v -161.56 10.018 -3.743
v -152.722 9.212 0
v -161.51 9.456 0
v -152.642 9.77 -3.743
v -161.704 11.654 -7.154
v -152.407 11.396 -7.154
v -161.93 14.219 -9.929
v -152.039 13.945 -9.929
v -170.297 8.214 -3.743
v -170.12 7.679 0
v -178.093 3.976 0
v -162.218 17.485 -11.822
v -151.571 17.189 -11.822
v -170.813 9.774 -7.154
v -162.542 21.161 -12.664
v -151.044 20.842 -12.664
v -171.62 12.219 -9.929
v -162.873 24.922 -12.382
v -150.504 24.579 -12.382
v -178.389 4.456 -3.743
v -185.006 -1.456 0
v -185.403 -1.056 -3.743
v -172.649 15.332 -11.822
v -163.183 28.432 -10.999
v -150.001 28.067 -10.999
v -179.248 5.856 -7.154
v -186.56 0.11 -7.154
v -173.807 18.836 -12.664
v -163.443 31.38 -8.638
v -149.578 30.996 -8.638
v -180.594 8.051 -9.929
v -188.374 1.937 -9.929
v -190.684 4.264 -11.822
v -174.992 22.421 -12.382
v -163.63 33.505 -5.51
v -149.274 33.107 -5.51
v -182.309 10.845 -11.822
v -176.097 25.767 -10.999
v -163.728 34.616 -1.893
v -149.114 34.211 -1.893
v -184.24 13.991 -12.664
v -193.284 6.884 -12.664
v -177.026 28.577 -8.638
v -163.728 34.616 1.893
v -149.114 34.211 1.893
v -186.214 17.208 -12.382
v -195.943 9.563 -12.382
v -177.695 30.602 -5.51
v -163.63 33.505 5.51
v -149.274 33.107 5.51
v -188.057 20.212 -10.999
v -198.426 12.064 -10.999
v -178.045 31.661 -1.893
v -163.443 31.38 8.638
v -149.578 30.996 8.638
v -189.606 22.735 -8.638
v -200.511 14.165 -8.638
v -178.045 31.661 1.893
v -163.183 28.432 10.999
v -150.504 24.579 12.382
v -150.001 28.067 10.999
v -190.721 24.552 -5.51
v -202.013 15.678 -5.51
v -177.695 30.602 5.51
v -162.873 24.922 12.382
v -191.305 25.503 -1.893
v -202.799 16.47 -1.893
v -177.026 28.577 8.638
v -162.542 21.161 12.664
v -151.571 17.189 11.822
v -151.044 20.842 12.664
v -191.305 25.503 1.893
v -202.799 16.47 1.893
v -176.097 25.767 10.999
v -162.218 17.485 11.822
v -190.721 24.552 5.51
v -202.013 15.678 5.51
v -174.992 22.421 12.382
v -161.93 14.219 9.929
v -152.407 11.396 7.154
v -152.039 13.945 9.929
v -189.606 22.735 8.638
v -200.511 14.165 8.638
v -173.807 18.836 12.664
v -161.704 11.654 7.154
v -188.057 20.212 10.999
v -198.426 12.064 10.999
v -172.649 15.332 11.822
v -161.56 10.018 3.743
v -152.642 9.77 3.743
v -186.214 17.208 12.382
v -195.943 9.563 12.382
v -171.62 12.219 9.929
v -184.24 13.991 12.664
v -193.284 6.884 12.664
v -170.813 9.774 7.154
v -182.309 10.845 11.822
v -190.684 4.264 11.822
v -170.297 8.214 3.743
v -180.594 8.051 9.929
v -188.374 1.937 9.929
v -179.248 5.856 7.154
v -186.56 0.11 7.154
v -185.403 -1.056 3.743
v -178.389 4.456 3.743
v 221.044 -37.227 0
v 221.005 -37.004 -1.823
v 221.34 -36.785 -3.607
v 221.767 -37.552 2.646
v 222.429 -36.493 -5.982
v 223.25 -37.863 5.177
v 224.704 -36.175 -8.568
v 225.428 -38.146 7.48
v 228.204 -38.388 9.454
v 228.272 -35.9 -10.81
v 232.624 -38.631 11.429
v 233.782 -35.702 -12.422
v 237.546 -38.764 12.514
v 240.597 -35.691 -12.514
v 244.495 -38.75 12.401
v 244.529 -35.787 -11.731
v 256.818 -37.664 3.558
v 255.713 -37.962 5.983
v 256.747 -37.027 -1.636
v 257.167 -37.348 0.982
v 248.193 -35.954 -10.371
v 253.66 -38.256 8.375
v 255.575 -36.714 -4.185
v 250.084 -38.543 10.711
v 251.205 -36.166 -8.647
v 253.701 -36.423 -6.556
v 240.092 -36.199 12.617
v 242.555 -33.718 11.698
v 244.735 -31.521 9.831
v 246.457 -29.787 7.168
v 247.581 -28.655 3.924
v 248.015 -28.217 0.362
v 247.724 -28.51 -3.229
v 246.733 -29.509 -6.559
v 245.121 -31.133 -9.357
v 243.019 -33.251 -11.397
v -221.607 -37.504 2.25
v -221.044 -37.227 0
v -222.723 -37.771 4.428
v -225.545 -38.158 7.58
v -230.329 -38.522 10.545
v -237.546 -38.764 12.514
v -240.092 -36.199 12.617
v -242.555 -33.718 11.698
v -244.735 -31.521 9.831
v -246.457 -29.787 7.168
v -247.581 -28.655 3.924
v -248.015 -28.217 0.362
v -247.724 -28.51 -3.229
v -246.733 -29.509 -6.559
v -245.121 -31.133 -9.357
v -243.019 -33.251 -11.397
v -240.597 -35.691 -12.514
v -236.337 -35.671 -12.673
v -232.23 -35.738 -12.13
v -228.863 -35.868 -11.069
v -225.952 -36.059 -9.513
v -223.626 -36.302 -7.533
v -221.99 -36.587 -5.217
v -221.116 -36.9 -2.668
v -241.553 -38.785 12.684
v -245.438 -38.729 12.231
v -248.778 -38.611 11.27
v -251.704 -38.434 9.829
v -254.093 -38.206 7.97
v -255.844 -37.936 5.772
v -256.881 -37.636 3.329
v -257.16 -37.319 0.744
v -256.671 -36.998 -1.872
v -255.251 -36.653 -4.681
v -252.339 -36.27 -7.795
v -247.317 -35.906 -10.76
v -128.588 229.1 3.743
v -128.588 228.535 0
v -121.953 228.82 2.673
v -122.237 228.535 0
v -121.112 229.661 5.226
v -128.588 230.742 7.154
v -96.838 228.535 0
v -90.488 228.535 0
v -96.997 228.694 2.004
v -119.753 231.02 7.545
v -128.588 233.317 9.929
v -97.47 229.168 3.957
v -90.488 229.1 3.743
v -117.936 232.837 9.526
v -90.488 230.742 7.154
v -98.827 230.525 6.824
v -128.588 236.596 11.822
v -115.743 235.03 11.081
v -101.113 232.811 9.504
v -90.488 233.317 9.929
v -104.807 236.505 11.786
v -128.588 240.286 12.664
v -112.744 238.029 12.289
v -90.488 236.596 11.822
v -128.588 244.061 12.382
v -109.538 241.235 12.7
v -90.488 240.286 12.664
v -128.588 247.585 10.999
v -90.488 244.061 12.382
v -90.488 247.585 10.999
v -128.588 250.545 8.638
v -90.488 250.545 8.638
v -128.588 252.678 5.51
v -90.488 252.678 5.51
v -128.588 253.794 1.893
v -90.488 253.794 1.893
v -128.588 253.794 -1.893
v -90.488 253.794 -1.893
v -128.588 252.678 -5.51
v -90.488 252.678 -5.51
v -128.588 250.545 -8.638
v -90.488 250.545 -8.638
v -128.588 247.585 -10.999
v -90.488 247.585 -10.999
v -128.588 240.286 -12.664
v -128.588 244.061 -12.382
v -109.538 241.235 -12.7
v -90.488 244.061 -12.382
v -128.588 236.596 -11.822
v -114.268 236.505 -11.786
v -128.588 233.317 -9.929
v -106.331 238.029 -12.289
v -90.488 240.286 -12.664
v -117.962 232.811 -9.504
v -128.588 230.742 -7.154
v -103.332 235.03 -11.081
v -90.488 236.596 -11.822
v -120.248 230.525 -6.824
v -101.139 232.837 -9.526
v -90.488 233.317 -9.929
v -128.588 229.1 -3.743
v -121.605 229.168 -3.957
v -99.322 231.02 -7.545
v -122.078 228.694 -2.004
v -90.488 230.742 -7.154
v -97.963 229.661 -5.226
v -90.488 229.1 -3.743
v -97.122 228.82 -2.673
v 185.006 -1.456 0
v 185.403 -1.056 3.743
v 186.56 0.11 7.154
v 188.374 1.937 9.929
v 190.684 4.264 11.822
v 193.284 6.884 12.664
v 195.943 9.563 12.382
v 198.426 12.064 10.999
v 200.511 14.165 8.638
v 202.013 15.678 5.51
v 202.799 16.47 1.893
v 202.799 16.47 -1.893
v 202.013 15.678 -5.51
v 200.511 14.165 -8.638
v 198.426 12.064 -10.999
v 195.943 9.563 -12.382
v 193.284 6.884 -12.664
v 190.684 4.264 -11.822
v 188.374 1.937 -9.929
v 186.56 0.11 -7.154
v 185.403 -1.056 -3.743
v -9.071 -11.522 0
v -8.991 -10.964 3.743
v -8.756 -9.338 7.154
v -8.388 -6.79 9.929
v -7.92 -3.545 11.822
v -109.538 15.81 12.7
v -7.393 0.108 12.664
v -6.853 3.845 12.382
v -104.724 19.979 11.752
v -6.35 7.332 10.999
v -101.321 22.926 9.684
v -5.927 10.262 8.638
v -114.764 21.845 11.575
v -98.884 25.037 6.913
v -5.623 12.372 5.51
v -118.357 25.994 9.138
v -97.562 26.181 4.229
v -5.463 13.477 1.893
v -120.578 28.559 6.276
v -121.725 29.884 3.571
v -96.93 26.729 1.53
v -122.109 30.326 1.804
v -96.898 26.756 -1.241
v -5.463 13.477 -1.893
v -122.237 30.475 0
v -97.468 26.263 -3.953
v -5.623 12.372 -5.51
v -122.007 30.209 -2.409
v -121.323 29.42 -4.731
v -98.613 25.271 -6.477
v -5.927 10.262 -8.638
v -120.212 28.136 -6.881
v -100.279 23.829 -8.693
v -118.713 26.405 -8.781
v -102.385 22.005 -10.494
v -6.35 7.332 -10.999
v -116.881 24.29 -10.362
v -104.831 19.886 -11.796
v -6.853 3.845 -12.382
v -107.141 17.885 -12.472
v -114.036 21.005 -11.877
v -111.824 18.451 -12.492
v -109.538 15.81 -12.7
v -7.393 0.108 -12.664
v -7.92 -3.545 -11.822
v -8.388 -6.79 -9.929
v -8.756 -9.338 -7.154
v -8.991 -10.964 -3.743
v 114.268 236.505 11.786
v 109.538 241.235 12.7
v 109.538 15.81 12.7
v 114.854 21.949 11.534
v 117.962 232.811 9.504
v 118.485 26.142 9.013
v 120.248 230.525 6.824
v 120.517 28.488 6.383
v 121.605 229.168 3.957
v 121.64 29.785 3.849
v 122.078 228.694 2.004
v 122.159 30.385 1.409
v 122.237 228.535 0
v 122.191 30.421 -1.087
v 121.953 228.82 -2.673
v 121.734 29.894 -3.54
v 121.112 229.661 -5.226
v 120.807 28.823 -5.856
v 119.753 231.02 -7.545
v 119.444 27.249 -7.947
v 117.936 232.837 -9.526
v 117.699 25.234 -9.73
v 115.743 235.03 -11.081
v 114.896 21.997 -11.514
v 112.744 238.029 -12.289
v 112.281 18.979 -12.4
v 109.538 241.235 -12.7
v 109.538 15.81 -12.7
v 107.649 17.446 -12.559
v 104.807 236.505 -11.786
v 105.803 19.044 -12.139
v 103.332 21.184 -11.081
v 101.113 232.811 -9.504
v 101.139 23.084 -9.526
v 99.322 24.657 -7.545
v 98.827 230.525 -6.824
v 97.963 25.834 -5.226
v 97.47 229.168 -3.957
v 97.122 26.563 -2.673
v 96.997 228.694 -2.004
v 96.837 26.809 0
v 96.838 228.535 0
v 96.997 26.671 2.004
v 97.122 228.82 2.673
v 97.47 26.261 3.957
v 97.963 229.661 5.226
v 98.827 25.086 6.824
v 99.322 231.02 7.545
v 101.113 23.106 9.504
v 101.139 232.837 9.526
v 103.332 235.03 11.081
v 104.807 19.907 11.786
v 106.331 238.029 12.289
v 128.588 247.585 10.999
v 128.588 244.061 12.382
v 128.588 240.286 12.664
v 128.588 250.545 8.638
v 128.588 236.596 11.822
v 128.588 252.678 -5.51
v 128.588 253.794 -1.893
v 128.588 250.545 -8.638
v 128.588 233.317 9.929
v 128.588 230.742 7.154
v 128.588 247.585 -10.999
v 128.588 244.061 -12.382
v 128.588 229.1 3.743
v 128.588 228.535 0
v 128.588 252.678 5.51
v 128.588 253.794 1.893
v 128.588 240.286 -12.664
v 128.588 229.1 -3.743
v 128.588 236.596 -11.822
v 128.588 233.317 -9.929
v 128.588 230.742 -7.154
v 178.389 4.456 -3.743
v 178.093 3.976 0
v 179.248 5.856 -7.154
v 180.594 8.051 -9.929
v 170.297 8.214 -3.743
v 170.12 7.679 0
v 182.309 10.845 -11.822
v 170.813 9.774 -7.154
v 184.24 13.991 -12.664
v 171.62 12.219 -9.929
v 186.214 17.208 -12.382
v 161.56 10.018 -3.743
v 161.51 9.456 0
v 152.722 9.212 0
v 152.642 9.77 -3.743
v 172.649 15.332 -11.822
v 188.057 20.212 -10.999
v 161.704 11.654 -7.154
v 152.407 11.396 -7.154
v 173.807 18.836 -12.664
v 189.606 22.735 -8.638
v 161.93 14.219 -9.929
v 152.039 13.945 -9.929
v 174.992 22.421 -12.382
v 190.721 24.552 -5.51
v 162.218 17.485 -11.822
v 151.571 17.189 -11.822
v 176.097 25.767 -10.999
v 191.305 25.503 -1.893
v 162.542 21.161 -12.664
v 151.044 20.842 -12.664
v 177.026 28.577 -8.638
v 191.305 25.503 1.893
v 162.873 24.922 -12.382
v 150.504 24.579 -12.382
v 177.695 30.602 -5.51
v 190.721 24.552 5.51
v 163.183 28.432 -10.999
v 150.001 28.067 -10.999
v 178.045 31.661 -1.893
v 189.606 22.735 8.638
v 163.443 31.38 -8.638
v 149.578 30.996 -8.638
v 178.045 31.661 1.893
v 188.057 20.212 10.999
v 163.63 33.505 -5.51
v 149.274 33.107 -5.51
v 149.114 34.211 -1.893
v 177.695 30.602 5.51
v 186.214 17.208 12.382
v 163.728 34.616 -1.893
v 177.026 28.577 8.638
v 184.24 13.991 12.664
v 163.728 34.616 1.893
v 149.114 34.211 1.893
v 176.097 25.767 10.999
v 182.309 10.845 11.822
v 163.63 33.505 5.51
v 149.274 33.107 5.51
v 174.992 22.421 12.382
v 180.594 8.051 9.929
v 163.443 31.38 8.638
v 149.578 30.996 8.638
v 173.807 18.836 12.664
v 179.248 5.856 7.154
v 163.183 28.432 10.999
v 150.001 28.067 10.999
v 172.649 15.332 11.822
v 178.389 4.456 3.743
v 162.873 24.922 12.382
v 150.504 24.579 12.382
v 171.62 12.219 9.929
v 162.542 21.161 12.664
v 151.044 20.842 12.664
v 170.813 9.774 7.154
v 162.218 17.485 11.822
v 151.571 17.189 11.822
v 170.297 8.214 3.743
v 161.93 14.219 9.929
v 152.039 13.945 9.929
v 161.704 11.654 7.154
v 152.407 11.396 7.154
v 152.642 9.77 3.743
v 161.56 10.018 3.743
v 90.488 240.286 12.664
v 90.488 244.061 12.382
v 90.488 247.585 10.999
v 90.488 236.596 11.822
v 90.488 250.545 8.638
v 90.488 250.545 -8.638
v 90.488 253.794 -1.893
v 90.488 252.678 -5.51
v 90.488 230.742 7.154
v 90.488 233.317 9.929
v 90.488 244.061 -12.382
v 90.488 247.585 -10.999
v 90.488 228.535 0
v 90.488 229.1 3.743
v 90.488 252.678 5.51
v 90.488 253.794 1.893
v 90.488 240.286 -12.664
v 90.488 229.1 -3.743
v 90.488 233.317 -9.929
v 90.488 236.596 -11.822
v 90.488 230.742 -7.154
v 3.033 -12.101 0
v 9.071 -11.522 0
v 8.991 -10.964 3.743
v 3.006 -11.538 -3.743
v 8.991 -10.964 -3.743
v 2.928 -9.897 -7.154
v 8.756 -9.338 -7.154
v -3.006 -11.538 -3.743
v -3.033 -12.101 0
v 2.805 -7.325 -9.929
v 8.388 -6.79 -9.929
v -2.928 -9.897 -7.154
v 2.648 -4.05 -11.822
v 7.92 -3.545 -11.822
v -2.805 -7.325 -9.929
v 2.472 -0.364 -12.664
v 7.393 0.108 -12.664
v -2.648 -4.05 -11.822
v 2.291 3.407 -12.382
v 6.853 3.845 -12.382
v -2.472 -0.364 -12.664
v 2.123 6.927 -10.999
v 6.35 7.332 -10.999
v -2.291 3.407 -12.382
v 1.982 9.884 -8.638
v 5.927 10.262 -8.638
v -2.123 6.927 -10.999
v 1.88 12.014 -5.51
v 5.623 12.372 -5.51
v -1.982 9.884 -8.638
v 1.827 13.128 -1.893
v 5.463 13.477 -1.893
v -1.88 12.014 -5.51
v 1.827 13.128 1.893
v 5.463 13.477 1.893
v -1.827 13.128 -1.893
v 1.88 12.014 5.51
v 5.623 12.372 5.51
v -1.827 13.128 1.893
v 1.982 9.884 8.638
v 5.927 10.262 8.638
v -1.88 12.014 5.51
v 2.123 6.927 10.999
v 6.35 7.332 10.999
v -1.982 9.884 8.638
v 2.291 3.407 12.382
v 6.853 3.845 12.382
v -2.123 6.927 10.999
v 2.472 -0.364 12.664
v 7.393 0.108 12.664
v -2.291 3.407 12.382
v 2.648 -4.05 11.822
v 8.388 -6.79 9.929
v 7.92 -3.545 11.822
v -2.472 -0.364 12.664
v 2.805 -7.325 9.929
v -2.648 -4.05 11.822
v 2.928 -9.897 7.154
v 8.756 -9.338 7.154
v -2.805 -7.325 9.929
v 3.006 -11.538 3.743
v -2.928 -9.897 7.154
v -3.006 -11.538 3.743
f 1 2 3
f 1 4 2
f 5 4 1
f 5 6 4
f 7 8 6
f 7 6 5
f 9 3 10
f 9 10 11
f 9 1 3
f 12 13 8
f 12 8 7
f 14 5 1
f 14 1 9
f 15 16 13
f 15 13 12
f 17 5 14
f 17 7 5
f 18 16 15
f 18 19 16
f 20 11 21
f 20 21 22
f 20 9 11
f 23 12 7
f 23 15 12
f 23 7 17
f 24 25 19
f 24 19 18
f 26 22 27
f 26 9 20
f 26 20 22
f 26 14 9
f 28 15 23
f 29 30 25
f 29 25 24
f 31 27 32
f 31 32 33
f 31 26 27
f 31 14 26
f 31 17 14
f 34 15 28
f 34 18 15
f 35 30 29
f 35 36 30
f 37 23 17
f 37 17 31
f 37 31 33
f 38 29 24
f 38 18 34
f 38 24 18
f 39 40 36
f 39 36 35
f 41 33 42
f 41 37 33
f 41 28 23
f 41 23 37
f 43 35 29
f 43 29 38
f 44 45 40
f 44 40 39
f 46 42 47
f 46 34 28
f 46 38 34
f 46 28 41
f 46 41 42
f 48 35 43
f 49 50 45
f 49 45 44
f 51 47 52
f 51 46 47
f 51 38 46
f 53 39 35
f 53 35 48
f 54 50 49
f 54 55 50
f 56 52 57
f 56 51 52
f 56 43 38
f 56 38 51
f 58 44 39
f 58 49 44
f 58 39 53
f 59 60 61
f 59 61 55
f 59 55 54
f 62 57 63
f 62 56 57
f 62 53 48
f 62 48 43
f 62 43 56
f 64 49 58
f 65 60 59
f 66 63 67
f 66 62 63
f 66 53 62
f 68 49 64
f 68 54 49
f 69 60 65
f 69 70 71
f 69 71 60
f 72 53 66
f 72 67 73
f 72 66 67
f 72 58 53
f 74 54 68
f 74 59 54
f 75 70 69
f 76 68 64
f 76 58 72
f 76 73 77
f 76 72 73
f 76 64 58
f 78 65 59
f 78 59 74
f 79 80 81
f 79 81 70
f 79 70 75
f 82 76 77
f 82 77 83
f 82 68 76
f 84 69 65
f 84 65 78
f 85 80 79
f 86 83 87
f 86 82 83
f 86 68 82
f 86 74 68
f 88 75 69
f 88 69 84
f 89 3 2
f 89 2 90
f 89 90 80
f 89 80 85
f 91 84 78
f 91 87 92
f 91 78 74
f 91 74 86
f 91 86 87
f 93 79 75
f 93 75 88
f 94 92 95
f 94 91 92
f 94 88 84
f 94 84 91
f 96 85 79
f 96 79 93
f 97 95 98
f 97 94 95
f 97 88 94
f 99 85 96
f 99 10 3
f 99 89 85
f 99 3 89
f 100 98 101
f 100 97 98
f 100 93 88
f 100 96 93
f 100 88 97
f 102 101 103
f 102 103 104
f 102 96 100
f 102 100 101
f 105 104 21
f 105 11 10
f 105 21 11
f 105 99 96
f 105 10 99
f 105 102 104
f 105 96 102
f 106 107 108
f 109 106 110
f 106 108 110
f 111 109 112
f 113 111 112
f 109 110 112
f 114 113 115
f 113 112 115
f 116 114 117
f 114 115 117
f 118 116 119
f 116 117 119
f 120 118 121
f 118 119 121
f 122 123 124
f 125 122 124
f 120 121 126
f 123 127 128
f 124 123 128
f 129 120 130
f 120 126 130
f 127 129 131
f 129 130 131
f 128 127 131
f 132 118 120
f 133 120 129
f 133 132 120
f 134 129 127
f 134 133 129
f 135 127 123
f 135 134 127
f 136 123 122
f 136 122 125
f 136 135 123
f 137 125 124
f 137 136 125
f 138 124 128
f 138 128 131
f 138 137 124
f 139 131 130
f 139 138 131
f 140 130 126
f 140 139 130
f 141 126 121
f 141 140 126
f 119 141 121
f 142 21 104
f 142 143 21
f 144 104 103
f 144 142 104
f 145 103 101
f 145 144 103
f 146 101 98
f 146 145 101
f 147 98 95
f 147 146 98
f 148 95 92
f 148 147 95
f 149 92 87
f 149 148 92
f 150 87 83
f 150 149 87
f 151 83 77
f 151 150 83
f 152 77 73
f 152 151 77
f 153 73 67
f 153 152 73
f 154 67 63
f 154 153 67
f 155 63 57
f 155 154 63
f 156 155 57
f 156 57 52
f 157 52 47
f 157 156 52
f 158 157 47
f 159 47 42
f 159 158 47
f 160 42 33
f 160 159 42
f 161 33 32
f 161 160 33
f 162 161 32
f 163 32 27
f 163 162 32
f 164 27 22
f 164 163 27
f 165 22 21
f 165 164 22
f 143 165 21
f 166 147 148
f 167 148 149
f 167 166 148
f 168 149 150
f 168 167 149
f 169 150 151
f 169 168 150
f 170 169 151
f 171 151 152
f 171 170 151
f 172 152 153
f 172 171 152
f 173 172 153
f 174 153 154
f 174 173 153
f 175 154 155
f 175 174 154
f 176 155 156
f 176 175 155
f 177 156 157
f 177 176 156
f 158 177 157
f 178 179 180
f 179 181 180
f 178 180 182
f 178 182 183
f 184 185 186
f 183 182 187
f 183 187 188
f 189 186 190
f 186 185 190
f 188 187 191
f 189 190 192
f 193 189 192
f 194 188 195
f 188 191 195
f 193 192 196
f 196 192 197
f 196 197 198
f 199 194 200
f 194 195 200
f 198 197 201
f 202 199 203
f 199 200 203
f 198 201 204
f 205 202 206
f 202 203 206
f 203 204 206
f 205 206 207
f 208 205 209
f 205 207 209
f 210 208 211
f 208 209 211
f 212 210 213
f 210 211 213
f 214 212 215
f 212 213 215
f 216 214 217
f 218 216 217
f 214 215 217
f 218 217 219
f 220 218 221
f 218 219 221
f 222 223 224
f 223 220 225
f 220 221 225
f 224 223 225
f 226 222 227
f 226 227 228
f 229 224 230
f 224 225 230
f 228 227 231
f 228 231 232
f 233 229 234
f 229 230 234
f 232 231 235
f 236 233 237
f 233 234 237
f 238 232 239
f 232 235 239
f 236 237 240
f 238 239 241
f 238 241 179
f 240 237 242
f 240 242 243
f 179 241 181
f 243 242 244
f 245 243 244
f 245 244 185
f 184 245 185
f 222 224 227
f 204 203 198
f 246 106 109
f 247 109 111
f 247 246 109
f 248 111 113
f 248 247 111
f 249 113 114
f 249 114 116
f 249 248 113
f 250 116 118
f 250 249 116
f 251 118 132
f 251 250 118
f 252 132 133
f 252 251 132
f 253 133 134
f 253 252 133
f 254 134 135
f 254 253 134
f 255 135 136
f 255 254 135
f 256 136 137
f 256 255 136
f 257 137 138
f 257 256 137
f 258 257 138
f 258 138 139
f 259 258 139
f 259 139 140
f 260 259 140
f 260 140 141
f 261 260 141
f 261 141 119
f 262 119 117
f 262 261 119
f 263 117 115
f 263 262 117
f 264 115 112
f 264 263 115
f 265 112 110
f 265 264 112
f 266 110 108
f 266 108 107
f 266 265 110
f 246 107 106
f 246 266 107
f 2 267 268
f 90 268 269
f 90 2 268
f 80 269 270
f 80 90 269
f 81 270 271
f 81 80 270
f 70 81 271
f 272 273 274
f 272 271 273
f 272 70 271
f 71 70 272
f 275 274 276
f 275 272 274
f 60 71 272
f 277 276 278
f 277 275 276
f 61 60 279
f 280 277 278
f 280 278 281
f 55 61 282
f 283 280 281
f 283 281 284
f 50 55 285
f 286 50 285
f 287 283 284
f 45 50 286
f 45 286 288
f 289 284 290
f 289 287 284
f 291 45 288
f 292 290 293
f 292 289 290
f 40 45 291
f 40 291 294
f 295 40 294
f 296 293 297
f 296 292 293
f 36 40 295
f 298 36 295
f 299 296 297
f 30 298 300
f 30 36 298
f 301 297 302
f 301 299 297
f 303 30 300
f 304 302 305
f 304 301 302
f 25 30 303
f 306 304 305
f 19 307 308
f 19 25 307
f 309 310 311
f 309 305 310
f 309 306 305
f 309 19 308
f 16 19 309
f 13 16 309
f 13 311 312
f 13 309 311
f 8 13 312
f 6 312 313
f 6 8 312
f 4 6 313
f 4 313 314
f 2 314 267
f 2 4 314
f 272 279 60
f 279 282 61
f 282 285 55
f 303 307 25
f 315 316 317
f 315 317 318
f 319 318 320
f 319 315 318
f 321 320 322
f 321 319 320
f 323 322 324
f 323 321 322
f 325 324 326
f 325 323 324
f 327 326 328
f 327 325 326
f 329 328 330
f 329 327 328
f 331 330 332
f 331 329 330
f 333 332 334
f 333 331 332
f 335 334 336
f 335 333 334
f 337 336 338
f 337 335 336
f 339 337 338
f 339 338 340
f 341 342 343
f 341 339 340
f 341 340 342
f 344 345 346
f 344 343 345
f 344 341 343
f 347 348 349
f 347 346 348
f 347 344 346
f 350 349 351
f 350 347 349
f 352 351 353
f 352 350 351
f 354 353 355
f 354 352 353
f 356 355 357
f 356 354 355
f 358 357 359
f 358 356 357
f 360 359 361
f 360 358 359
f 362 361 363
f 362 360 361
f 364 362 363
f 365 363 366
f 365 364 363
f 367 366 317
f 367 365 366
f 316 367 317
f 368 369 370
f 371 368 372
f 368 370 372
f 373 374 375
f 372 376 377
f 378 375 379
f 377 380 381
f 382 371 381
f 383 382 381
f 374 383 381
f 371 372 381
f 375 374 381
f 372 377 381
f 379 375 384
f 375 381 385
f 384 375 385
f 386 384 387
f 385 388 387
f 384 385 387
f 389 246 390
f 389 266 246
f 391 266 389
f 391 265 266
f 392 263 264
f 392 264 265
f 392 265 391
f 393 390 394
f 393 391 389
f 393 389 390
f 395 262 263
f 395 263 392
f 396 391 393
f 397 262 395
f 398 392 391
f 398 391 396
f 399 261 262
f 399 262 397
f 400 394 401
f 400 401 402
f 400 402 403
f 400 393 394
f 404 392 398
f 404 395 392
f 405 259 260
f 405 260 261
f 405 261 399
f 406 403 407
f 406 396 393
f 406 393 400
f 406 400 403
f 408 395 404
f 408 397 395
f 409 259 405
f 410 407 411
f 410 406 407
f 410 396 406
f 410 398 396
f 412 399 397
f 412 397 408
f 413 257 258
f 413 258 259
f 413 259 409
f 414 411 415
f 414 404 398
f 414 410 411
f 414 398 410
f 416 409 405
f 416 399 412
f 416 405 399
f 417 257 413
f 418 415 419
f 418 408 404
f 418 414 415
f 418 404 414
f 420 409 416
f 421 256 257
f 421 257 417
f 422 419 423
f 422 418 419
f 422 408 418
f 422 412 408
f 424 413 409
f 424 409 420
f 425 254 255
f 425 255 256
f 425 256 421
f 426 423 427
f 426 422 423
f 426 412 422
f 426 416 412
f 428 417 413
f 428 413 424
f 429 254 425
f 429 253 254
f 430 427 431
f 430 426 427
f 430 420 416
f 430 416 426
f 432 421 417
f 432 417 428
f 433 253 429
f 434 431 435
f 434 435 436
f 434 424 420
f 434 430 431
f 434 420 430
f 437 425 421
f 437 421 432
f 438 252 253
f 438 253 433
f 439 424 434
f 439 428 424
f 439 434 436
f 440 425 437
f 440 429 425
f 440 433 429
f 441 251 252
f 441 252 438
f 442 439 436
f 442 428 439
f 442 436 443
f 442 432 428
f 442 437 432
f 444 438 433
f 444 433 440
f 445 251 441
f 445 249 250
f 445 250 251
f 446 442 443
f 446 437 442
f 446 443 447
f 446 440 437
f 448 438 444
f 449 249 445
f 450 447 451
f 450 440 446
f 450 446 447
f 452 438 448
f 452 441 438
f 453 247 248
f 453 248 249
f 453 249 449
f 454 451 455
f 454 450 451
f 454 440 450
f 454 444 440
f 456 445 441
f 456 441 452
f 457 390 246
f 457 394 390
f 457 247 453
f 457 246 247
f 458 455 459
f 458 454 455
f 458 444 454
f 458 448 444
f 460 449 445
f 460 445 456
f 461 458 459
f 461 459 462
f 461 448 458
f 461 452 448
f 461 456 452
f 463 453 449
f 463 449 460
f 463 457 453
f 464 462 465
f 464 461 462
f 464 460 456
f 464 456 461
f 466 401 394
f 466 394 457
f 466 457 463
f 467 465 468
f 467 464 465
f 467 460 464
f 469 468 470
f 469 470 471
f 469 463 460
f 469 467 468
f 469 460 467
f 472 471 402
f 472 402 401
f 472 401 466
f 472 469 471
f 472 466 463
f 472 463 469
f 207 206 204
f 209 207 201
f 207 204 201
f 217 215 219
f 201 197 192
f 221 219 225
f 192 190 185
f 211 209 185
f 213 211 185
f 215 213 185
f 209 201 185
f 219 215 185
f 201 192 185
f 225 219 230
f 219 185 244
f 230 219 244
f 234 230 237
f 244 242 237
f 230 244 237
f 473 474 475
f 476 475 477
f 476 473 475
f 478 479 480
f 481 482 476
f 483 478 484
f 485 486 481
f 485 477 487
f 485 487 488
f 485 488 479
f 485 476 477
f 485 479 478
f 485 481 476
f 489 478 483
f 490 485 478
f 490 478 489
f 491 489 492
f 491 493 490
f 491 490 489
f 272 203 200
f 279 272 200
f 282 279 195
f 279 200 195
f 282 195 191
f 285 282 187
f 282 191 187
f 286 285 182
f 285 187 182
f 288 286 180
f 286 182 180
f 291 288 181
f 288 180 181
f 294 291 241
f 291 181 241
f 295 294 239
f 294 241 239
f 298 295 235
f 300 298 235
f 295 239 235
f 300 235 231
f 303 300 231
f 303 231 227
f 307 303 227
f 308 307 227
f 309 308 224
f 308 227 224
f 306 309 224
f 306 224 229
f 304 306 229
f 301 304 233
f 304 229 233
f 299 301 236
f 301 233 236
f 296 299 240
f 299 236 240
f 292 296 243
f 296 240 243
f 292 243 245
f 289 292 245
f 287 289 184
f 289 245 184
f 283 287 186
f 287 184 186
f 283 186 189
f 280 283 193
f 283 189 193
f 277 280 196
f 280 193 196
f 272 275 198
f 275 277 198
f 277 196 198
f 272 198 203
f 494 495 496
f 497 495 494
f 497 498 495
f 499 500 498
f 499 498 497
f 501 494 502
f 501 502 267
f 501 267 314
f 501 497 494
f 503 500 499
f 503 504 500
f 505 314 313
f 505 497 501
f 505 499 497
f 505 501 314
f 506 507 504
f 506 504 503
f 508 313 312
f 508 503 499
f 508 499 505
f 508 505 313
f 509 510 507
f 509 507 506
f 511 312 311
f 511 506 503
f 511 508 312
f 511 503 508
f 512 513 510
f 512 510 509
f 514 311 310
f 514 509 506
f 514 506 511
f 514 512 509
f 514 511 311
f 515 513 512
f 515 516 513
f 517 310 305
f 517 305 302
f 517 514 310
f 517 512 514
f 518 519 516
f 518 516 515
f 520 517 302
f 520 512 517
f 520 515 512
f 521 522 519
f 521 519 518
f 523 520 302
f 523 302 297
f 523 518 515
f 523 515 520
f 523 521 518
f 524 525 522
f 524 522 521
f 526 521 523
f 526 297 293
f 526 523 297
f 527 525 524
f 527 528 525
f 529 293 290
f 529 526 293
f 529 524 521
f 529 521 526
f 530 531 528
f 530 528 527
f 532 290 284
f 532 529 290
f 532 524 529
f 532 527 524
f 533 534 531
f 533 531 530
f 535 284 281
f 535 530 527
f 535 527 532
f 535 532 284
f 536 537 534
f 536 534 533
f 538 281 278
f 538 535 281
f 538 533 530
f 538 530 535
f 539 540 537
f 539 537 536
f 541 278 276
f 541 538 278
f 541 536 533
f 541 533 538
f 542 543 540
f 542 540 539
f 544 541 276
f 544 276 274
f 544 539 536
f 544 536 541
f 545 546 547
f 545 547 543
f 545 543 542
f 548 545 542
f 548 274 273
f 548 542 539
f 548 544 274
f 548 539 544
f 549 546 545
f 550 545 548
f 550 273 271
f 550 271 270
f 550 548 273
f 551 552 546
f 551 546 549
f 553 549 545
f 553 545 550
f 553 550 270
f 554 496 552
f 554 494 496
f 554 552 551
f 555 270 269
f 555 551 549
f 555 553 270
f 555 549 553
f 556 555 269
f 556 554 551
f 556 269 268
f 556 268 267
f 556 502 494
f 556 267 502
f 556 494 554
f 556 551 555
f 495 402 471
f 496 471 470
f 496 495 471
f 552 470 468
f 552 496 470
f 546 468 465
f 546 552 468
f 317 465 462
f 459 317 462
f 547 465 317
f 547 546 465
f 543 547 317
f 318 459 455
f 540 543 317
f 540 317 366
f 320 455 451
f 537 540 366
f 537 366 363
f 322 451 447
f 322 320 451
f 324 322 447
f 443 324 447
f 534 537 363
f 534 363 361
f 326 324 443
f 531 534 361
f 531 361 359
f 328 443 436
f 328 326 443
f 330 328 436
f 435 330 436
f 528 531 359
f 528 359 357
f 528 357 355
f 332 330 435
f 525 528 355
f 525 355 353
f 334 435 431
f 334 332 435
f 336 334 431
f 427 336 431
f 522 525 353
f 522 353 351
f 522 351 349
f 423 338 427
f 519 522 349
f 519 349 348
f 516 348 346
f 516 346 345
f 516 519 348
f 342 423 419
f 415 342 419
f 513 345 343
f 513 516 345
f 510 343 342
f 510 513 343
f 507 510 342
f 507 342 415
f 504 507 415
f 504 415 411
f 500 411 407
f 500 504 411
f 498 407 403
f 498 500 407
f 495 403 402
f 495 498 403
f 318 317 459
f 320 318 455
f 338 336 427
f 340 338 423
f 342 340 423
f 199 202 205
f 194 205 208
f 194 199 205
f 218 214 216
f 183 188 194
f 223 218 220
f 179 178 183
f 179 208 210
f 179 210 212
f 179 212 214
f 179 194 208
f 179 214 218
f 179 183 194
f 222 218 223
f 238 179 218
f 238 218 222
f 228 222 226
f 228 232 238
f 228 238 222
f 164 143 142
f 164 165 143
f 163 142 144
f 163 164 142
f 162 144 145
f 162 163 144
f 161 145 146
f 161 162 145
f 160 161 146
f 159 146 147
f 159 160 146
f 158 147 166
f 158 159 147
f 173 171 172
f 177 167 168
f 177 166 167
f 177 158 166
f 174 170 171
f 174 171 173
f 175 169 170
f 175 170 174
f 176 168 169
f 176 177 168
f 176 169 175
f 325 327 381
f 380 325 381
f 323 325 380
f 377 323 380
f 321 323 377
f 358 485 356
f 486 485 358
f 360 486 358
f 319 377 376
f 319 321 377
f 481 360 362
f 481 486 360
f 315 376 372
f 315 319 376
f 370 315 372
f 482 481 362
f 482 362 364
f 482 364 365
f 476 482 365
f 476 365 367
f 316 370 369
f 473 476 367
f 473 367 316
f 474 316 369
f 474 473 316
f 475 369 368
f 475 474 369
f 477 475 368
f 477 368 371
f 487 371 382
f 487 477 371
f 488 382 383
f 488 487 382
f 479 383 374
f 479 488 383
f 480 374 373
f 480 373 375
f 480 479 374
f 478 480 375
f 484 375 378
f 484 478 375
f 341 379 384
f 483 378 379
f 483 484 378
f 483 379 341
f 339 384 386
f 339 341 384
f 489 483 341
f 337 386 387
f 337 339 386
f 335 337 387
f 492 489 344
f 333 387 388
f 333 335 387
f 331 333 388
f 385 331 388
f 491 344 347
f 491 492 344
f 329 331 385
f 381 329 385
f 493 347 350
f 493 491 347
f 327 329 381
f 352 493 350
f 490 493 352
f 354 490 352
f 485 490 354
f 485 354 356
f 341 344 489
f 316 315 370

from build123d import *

# Parameters (mm, degrees)
SWEEP1_PROFILE_R     = 12.7
SWEEP2_PROFILE_R     = 12.7
SWEEP3_PROFILE_R     = 12.7
CUT_SWEEP1_START     = -81.549620248
CUT_SWEEP1_OUTLINE_W = 67
CUT_SWEEP1_OUTLINE_H = 33
CUT_SWEEP1_DEPTH     = 44.599672867


# Read off the part's stored shape, not the designer's step: Cut-Sweep1
with BuildPart() as part:
    # Sweep1: sweep along a path in Sketch1
    with BuildLine(Plane.XY) as sweep1_path:
        Line((275.126088043, -73.014540772), (239.071642227, -37.227435037))
        Line((239.071642227, -37.227435037), (193.952445621, 7.557207275))
        ThreePointArc((193.952445621, 7.557207275), (174.105035635, 19.737252225), (150.908197029, 21.781722044))
        Line((150.908197029, 21.781722044), (7.257142857, 1.047478346))
        ThreePointArc((7.257142857, 1.047478346), (0, 0.526438931), (-7.257142857, 1.047478346))
        Line((-7.257142857, 1.047478346), (-150.908197029, 21.781722044))
        ThreePointArc((-150.908197029, 21.781722044), (-174.105035635, 19.737252225), (-193.952445621, 7.557207275))
        Line((-193.952445621, 7.557207275), (-239.071642227, -37.227435037))
        Line((-239.071642227, -37.227435037), (-275.126088043, -73.014540772))
    # Sweep1 profile (on start of the path) → Sweep1 (sweep)
    with BuildSketch(Plane(origin=(275.126088043, -73.014540772, 0), x_dir=(-0.7044705853386212, -0.7097331853539472, 0), z_dir=(-0.7097331853539472, 0.7044705853386212, 0))):
        Circle(SWEEP1_PROFILE_R)
    sweep(path=sweep1_path.line)

    # Sweep2: sweep along a path in Sketch1<3>
    with BuildLine(Plane.XY) as sweep2_path:
        Line((109.5375, 15.810376278), (109.5375, 241.235376278))
    # Sweep2 profile (on start of the path) → Sweep2 (sweep)
    with BuildSketch(Plane(origin=(109.5375, 15.810376278, 0), x_dir=(0, 0, 1), z_dir=(0, 1, 0))):
        Circle(SWEEP2_PROFILE_R)
    sweep2 = sweep(path=sweep2_path.line)

    # Sweep3: sweep along a path in Sketch1<4>
    with BuildLine(Plane.XY) as sweep3_path:
        Line((128.5875, 241.235376278), (90.4875, 241.235376278))
    # Sweep3 profile (on start of the path) → Sweep3 (sweep)
    with BuildSketch(Plane(origin=(128.5875, 241.235376278, 0), x_dir=(0, -1, 0), z_dir=(-1, 0, 0))):
        Circle(SWEEP3_PROFILE_R)
    sweep3 = sweep(path=sweep3_path.line)

    # Cut-Sweep1 outline → Cut-Sweep1 (cut)
    with BuildSketch(Plane(origin=(0, 0, 0), x_dir=(1, 0, 0), z_dir=(0, 0.992546151641322, 0.121869343405149)).offset(CUT_SWEEP1_START)):
        with Locations((252.5, -6.5)):
            Rectangle(CUT_SWEEP1_OUTLINE_W, CUT_SWEEP1_OUTLINE_H)
    cut_sweep1 = extrude(amount=CUT_SWEEP1_DEPTH, mode=Mode.SUBTRACT)

    # Mirror2: Sweep2, Sweep3, Cut-Sweep1 across plane
    add(sweep2.mirror(Plane(origin=(0, 0, 0), x_dir=(0, 0, 1), z_dir=(1, 0, 0))))
    add(sweep3.mirror(Plane(origin=(0, 0, 0), x_dir=(0, 0, 1), z_dir=(1, 0, 0))))
    add(cut_sweep1.mirror(Plane(origin=(0, 0, 0), x_dir=(0, 0, 1), z_dir=(1, 0, 0))), mode=Mode.SUBTRACT)


solid = part.part
